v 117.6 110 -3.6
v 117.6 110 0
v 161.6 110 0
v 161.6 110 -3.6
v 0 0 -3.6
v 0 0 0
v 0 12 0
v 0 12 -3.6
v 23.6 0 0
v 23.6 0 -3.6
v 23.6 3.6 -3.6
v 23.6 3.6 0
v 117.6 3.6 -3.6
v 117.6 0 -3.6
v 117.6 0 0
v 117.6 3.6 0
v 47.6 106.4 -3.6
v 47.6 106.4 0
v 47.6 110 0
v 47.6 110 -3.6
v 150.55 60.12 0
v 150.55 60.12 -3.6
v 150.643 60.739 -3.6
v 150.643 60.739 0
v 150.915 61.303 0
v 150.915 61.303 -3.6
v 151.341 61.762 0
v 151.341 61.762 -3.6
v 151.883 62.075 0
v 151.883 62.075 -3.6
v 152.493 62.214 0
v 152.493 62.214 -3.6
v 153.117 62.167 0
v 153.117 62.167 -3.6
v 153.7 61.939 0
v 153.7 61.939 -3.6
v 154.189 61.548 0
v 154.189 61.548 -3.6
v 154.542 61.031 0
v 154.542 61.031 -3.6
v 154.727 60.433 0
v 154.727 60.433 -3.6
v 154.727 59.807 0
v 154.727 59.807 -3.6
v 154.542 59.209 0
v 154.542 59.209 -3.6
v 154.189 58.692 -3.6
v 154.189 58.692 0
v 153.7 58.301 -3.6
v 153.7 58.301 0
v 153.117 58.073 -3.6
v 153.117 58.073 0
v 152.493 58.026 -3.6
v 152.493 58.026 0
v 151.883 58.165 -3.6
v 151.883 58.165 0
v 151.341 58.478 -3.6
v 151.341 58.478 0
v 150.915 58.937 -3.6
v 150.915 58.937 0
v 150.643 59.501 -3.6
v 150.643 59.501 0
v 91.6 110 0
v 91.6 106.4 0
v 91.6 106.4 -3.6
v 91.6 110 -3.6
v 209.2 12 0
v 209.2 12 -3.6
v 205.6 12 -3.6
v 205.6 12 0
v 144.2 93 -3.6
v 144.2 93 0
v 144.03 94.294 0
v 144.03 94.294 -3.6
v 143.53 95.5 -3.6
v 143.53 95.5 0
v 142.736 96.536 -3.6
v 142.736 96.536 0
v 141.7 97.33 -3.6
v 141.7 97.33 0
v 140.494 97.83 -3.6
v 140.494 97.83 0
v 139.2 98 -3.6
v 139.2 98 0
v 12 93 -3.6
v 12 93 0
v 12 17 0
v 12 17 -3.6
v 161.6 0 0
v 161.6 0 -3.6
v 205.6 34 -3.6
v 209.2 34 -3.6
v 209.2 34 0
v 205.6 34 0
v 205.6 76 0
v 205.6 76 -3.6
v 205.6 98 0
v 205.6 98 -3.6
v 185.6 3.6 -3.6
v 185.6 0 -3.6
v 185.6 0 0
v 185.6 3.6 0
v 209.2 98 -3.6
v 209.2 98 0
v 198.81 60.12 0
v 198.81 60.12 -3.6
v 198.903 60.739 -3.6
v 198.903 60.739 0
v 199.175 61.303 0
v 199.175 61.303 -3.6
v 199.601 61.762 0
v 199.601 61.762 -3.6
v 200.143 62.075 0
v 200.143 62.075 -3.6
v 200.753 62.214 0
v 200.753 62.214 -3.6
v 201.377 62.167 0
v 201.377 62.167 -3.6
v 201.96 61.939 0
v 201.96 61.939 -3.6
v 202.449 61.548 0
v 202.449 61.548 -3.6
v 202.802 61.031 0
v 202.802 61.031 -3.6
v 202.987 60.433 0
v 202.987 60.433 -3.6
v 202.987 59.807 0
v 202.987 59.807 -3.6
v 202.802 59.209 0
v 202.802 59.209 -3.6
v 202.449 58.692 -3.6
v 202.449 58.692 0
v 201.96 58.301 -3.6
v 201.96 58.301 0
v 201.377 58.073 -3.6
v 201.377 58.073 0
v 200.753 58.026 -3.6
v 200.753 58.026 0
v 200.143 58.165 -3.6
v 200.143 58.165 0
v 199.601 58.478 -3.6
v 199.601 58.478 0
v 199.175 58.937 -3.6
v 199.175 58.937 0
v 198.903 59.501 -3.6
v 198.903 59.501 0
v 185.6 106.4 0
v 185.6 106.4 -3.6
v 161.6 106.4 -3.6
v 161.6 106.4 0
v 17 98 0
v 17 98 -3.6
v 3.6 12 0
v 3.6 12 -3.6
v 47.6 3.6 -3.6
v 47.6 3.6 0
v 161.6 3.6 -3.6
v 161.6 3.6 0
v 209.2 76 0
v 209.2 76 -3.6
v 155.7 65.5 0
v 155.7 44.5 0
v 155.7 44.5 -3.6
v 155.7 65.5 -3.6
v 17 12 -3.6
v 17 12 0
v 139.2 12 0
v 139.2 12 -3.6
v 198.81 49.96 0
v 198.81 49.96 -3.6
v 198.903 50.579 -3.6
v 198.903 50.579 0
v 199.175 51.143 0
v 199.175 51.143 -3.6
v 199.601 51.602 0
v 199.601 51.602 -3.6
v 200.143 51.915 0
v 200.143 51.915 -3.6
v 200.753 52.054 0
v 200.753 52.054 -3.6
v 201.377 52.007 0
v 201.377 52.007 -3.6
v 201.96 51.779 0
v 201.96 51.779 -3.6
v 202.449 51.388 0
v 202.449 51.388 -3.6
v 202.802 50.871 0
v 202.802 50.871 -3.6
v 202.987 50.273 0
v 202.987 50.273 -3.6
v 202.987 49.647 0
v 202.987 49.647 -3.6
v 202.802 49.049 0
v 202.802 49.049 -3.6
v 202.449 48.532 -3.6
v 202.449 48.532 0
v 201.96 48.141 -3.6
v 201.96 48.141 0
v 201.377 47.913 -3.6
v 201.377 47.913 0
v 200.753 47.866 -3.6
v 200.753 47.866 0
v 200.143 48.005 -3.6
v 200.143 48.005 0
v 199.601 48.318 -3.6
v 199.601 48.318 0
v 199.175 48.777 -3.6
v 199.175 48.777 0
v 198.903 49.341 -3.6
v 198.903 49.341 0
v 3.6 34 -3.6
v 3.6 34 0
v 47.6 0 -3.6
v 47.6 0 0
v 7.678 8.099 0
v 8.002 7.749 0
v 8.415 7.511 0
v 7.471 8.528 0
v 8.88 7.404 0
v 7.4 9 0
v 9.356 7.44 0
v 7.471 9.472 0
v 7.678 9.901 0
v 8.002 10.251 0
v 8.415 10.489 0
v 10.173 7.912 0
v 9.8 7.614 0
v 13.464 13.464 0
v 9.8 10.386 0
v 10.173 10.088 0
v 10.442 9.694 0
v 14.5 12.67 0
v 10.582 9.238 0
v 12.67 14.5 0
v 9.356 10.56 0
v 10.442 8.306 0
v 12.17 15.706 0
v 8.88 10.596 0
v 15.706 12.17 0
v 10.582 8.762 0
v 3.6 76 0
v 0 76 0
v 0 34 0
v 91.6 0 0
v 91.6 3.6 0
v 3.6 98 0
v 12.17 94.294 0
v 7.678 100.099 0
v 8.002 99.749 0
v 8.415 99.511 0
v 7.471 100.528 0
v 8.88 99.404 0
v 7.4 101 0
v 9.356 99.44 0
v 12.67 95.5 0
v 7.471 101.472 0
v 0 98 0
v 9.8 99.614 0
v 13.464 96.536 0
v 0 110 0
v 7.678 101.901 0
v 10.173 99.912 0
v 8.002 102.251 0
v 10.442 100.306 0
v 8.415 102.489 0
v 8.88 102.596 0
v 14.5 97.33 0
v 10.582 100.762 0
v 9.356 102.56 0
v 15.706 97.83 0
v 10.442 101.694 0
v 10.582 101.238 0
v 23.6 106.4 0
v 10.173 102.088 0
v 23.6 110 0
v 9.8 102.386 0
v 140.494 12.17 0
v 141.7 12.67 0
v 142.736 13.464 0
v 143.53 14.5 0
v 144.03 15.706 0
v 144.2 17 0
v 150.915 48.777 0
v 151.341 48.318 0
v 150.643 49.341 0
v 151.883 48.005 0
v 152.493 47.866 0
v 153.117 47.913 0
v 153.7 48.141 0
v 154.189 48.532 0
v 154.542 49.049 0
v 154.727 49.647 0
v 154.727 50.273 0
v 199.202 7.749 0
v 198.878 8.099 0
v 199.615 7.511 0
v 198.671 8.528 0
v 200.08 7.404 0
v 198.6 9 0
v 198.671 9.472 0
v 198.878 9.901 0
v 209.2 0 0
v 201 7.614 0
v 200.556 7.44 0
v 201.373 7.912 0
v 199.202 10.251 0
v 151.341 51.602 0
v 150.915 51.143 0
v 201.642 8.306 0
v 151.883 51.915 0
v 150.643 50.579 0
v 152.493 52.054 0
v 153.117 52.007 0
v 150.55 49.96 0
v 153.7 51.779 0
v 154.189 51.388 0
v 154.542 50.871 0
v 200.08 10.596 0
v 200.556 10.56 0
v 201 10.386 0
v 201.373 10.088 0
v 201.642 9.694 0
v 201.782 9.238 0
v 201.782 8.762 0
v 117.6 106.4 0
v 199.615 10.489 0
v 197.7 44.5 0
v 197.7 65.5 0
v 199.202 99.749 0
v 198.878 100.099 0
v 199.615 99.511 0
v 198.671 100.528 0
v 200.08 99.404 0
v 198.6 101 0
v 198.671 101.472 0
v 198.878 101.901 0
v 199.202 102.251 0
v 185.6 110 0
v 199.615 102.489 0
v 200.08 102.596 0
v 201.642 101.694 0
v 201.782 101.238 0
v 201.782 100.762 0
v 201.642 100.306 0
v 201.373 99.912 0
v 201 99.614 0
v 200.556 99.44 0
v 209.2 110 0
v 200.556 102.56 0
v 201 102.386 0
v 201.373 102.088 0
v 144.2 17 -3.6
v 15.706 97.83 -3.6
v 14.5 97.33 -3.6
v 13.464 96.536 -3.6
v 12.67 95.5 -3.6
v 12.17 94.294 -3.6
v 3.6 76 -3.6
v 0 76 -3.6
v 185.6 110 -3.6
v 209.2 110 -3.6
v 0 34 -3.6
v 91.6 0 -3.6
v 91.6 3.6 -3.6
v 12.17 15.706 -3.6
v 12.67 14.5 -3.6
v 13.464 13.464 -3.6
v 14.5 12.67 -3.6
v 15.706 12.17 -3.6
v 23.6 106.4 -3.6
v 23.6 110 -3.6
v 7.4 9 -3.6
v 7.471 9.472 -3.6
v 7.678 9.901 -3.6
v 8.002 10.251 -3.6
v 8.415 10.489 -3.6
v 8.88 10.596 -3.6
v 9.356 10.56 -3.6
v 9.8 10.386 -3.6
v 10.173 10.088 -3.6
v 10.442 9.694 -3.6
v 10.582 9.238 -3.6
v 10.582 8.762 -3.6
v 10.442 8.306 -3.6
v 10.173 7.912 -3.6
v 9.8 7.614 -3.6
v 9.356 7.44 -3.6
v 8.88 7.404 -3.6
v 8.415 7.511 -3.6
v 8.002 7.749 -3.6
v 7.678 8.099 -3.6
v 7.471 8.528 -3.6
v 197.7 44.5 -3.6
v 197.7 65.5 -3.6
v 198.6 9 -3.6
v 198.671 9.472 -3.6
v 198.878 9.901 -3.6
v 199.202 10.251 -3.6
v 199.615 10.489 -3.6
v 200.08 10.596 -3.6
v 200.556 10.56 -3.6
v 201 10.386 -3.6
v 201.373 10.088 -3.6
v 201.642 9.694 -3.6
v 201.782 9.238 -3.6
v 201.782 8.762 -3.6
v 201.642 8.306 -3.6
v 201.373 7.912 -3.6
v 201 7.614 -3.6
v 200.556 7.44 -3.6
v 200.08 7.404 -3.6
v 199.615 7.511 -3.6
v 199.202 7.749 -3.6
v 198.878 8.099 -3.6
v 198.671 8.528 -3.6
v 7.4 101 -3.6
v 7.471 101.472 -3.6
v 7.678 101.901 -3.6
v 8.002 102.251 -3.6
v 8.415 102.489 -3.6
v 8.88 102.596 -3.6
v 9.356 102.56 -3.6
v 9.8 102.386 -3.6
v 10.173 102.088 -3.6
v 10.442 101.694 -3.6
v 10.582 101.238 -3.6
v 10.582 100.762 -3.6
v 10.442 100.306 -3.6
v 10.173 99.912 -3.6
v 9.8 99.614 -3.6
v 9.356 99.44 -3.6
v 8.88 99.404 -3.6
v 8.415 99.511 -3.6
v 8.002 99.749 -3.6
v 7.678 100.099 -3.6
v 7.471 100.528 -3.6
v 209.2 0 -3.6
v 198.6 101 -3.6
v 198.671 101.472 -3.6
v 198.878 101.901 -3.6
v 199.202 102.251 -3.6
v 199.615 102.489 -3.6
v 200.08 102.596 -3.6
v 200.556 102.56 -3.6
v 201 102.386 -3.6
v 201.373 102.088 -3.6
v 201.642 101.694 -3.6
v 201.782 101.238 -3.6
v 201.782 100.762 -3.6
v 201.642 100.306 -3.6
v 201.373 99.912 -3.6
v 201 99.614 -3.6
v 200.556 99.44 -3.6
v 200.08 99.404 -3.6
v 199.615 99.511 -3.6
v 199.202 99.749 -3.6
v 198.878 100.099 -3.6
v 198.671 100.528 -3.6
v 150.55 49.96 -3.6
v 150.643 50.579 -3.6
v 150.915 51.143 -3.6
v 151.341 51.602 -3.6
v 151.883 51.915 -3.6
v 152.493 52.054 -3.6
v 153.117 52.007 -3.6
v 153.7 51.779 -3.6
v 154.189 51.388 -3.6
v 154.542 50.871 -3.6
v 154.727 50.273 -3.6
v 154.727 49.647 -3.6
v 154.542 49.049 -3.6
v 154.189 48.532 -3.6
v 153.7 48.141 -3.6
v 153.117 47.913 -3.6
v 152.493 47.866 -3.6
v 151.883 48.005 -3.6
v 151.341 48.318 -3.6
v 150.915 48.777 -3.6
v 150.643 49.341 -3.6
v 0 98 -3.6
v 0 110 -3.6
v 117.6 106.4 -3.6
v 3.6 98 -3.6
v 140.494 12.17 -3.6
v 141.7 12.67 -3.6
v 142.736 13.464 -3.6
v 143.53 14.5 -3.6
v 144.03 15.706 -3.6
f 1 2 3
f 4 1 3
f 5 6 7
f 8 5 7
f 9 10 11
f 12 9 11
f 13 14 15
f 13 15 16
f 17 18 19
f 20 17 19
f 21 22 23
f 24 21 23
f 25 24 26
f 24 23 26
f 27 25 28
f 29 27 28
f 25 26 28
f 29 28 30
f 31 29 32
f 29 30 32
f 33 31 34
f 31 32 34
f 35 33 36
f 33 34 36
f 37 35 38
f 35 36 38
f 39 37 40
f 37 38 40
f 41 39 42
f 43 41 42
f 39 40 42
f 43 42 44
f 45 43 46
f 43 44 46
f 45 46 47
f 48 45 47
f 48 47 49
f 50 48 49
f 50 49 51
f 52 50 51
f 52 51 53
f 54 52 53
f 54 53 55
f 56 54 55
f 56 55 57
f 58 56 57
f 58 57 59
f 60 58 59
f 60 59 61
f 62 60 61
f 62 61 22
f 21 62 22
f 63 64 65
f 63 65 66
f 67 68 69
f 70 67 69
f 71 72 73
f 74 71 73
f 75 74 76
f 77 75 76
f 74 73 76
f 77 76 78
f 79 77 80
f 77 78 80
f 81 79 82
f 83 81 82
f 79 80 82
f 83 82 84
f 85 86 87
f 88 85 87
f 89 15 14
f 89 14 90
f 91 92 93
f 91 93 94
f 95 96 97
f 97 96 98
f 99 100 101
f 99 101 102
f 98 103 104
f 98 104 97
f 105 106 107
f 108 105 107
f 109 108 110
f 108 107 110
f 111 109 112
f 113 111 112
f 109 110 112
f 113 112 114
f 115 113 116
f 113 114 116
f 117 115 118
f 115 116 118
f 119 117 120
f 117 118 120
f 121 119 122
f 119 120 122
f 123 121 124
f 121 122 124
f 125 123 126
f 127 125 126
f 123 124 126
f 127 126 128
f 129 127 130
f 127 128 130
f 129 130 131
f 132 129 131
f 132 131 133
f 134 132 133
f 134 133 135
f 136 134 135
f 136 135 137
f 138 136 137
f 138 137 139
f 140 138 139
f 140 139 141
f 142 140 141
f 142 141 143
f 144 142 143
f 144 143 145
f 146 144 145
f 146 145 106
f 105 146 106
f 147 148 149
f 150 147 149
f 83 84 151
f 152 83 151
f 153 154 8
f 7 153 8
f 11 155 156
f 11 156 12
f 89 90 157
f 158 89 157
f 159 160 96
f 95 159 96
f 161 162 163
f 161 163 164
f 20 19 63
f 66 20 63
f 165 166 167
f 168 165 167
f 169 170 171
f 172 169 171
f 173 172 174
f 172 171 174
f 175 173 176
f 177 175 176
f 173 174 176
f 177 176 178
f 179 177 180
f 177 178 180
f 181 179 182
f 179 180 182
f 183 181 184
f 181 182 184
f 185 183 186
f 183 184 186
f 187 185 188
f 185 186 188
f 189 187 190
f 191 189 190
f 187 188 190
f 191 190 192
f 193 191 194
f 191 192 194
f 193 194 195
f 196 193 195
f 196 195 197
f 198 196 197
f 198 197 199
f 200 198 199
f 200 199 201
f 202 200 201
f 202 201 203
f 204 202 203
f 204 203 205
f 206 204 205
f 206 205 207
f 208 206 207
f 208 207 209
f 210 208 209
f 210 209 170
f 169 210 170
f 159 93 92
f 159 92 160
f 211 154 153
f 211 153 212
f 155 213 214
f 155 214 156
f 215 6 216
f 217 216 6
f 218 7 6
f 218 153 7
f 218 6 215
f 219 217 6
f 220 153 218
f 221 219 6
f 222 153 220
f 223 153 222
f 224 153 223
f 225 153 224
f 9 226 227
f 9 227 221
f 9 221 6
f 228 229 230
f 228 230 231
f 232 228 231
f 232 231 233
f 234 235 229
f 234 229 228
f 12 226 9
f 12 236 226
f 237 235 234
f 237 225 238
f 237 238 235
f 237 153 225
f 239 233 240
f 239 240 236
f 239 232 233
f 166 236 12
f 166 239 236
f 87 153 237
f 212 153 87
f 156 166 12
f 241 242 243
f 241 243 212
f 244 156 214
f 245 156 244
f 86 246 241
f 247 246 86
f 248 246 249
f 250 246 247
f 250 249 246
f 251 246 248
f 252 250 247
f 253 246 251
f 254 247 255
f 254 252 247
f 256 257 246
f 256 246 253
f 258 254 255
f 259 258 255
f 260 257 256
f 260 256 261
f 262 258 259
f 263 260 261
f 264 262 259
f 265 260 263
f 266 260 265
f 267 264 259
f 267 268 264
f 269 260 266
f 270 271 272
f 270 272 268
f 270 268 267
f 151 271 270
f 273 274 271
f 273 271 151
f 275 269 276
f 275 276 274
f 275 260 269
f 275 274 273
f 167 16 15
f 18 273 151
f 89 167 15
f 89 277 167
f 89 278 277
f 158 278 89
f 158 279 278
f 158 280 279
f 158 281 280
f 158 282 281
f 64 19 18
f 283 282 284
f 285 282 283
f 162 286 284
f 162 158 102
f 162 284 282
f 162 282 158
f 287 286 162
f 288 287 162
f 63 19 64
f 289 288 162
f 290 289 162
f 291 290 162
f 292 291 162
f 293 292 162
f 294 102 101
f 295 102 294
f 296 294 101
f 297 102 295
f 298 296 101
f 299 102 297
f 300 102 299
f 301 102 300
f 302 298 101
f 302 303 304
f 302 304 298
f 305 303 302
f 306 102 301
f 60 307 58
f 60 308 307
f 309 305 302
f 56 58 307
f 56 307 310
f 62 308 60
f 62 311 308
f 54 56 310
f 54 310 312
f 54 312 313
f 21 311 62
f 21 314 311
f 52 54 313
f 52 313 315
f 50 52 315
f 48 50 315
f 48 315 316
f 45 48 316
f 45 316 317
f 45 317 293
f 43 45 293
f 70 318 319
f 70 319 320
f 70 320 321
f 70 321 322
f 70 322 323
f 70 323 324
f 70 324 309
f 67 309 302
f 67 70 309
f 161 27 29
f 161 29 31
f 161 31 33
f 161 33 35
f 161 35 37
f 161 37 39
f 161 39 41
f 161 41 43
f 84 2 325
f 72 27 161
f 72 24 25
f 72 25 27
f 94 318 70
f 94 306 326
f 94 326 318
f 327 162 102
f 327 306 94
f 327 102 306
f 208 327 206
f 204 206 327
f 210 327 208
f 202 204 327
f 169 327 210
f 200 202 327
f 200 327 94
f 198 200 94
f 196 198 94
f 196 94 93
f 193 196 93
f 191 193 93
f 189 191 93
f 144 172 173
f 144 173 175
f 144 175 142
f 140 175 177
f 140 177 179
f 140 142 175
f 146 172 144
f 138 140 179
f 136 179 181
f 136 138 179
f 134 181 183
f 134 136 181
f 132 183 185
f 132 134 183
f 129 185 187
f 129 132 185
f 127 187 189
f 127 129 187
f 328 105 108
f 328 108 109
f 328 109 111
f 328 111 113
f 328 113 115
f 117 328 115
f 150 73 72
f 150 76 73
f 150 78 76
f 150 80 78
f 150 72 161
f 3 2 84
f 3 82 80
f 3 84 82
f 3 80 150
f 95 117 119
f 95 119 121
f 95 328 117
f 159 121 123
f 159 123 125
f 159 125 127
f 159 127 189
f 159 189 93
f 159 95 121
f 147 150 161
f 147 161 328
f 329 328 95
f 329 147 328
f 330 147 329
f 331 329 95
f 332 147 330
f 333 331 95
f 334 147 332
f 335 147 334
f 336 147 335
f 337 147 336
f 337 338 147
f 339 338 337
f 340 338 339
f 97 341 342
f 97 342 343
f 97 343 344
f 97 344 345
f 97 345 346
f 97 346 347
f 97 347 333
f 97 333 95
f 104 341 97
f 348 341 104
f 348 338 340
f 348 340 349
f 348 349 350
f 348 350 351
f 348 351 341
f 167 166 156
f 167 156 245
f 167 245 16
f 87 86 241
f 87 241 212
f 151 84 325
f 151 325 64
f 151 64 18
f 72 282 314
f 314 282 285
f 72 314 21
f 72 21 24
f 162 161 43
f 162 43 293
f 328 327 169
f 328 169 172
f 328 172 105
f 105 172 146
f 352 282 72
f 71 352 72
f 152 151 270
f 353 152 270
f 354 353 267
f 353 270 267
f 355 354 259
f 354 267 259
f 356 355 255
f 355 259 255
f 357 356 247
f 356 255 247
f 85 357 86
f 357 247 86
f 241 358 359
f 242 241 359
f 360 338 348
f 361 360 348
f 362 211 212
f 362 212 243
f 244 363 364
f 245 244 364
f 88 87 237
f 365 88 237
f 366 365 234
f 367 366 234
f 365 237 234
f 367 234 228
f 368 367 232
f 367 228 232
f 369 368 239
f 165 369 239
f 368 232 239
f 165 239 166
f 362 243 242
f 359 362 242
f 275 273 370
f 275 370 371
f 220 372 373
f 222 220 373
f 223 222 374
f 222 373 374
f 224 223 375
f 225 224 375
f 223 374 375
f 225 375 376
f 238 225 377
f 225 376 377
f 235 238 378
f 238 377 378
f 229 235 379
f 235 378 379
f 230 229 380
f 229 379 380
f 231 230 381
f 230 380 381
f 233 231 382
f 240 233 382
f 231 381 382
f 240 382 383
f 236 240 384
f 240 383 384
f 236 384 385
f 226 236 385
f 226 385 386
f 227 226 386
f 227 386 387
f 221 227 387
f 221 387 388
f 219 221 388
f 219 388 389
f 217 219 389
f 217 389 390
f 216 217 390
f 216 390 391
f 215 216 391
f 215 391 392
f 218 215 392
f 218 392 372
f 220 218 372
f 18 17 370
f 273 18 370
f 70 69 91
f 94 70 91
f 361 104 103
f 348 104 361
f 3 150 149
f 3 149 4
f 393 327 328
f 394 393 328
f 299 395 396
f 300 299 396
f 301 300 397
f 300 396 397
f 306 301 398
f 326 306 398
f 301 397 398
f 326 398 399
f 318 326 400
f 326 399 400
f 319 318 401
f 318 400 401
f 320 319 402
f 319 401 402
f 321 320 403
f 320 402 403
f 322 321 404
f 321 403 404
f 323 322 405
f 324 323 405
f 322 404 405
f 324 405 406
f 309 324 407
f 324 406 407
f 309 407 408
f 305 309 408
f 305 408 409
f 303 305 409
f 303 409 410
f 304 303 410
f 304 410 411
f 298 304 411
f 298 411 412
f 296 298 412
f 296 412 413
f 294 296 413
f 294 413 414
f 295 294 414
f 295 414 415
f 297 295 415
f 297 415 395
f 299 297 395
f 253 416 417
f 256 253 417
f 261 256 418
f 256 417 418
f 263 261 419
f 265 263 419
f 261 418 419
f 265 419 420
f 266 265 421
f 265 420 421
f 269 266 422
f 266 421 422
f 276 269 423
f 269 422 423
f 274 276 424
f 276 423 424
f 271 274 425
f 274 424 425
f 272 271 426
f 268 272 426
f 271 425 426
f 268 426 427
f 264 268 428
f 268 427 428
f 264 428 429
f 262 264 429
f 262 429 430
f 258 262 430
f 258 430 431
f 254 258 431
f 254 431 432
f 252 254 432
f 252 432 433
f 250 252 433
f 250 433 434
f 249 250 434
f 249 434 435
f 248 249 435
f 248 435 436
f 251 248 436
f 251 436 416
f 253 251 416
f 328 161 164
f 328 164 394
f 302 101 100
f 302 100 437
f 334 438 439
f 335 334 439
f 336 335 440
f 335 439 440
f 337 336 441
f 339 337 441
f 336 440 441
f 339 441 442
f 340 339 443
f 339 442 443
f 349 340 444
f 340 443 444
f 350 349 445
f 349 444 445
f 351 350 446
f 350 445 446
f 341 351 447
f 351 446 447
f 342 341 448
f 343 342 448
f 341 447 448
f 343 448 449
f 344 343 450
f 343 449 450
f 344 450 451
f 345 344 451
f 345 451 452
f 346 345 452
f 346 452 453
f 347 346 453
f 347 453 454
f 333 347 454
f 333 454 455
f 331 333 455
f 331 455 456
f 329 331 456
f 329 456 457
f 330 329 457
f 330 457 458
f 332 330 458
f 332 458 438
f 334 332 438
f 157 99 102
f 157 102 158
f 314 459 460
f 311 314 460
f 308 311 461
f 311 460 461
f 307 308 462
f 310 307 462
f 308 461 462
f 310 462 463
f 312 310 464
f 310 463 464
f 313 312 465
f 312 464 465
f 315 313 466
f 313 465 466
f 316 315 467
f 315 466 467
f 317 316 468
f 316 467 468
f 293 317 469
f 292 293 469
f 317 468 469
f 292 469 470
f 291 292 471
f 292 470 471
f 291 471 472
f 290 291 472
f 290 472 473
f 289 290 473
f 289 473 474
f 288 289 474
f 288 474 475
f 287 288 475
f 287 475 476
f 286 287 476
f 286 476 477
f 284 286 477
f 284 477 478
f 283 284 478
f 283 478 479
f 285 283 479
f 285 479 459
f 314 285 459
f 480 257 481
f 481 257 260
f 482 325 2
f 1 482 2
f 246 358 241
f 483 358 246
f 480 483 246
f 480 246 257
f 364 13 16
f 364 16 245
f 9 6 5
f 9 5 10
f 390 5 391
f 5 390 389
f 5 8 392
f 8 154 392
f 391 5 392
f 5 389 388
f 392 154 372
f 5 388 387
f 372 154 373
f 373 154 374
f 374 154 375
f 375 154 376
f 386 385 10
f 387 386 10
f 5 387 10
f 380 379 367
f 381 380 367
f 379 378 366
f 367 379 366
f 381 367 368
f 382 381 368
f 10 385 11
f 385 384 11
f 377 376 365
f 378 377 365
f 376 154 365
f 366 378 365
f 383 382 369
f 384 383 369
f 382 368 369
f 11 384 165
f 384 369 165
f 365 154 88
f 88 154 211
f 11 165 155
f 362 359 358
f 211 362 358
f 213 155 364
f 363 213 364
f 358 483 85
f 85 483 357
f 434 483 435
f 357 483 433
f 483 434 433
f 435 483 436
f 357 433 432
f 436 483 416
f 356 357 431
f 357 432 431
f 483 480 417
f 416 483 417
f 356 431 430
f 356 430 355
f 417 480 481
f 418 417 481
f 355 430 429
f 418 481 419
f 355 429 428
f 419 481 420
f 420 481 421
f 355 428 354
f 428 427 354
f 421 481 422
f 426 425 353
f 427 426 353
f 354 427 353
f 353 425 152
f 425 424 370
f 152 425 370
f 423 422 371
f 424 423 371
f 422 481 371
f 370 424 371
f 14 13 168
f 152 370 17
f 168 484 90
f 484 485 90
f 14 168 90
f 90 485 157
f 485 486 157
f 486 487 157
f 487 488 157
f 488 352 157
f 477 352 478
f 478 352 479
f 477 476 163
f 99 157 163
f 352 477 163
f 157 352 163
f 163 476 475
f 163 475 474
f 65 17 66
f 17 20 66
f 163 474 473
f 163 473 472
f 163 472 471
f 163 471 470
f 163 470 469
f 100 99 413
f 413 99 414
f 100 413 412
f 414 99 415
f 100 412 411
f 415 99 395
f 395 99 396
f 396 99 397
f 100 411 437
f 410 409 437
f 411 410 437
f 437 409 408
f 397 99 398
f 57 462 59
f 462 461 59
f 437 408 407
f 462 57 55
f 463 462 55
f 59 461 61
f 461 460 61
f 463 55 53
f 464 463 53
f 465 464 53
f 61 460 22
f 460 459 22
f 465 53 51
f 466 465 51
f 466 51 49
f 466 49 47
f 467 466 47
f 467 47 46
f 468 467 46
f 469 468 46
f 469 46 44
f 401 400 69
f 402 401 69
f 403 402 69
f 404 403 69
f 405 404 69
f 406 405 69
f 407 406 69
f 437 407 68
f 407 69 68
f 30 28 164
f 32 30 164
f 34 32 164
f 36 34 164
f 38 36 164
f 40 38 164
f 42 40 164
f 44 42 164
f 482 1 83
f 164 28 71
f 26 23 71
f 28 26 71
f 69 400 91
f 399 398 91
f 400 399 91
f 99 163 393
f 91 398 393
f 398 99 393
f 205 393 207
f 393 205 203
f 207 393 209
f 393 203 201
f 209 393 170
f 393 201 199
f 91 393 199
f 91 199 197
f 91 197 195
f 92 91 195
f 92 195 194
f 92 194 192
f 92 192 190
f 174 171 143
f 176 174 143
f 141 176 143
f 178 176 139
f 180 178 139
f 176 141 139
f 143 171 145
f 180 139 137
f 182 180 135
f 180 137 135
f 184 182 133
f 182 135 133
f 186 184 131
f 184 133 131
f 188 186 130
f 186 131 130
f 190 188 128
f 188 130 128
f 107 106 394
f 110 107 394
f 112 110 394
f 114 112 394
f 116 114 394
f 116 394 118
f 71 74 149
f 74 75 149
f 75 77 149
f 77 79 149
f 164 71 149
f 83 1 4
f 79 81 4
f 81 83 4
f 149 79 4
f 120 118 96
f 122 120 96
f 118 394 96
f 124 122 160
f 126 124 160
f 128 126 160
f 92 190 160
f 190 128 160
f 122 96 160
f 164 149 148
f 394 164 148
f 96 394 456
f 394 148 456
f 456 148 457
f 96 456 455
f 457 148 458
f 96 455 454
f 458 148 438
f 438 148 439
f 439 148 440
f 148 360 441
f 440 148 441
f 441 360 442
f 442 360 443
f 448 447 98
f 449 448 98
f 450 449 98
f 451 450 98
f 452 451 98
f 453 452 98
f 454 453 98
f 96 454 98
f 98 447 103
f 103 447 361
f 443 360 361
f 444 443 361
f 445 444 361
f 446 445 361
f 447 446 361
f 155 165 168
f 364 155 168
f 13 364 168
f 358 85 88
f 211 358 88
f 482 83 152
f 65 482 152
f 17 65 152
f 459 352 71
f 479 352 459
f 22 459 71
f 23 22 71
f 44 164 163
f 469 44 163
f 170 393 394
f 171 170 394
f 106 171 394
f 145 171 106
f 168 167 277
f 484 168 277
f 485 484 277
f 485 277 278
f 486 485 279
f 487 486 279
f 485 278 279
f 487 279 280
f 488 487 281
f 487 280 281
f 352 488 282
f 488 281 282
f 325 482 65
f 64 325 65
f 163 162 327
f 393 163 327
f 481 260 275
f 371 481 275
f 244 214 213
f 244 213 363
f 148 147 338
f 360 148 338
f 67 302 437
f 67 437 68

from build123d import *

# Parameters (mm, degrees)
SKETCH_1_W             = 209.2
SKETCH_1_H             = 110
SM_BASE_FLANGE_1_DEPTH = 3.6
CUT_EXTRUDE_1_REACH    = 238.384
SKETCH_6_W             = 42
SKETCH_6_H             = 21
CUT_EXTRUDE_2_REACH    = 238.384
SKETCH_7_W             = 3.6
SKETCH_7_H             = 22
SKETCH_7_W_2           = 24
SKETCH_7_H_2           = 3.6
SKETCH_7_W_3           = 26
SKETCH_8_R             = 1.6
CUT_EXTRUDE_3_DEPTH    = 10
CUT_EXTRUDE_4_REACH    = 238.384
SKETCH_9_R             = 2.1


# Sheet-metal steps are written as plain solids
with BuildPart() as part:
    # Sketch 1 → Базовая кромка1 (new body)
    with BuildSketch(Plane.XY):
        with Locations((104.6, 55)):
            Rectangle(SKETCH_1_W, SKETCH_1_H)
        with BuildLine():
            Line((17, 12), (139.2, 12))
            ThreePointArc((139.2, 12), (142.735533906, 13.464466094), (144.2, 17))
            Line((144.2, 17), (144.2, 93))
            ThreePointArc((144.2, 93), (142.735533906, 96.535533906), (139.2, 98))
            Line((139.2, 98), (17, 98))
            ThreePointArc((17, 98), (13.464466094, 96.535533906), (12, 93))
            Line((12, 93), (12, 17))
            ThreePointArc((12, 17), (13.464466094, 13.464466094), (17, 12))
        make_face(mode=Mode.SUBTRACT)
    extrude(amount=-SM_BASE_FLANGE_1_DEPTH)

    # Эскиз6 → Вырез-Вытянуть1 (cut, up to next)
    with BuildSketch(Plane.XY, mode=Mode.PRIVATE) as cut_extrude_1_sk1:
        with Locations((176.7, 55)):
            Rectangle(SKETCH_6_W, SKETCH_6_H)
    cut_extrude_1_tool1 = extrude(cut_extrude_1_sk1.sketch, amount=-CUT_EXTRUDE_1_REACH, mode=Mode.PRIVATE) & part.part
    add(cut_extrude_1_tool1.solids().sort_by_distance((176.7, 55, 0))[0], mode=Mode.SUBTRACT)

    # Эскиз7 → Вырез-Вытянуть2 (cut, up to next)
    with BuildSketch(Plane(origin=(0, 0, -3.6), x_dir=(-1, 0, 0), z_dir=(0, 0, -1)), mode=Mode.PRIVATE) as cut_extrude_2_sk1:
        with Locations((-1.8, 87)):
            Rectangle(SKETCH_7_W, SKETCH_7_H)
    cut_extrude_2_tool1 = extrude(cut_extrude_2_sk1.sketch, amount=-CUT_EXTRUDE_2_REACH, mode=Mode.PRIVATE) & part.part
    # Эскиз7 → Вырез-Вытянуть2 (cut, up to next)
    with BuildSketch(Plane(origin=(0, 0, -3.6), x_dir=(-1, 0, 0), z_dir=(0, 0, -1)), mode=Mode.PRIVATE) as cut_extrude_2_sk2:
        with Locations((-35.6, 108.2)):
            Rectangle(SKETCH_7_W_2, SKETCH_7_H_2)
    cut_extrude_2_tool2 = extrude(cut_extrude_2_sk2.sketch, amount=-CUT_EXTRUDE_2_REACH, mode=Mode.PRIVATE) & part.part
    # Эскиз7 → Вырез-Вытянуть2 (cut, up to next)
    with BuildSketch(Plane(origin=(0, 0, -3.6), x_dir=(-1, 0, 0), z_dir=(0, 0, -1)), mode=Mode.PRIVATE) as cut_extrude_2_sk3:
        with Locations((-104.6, 108.2)):
            Rectangle(SKETCH_7_W_3, SKETCH_7_H_2)
    cut_extrude_2_tool3 = extrude(cut_extrude_2_sk3.sketch, amount=-CUT_EXTRUDE_2_REACH, mode=Mode.PRIVATE) & part.part
    # Эскиз7 → Вырез-Вытянуть2 (cut, up to next)
    with BuildSketch(Plane(origin=(0, 0, -3.6), x_dir=(-1, 0, 0), z_dir=(0, 0, -1)), mode=Mode.PRIVATE) as cut_extrude_2_sk4:
        with Locations((-173.6, 108.2)):
            Rectangle(SKETCH_7_W_2, SKETCH_7_H_2)
    cut_extrude_2_tool4 = extrude(cut_extrude_2_sk4.sketch, amount=-CUT_EXTRUDE_2_REACH, mode=Mode.PRIVATE) & part.part
    # Эскиз7 → Вырез-Вытянуть2 (cut, up to next)
    with BuildSketch(Plane(origin=(0, 0, -3.6), x_dir=(-1, 0, 0), z_dir=(0, 0, -1)), mode=Mode.PRIVATE) as cut_extrude_2_sk5:
        with Locations((-207.4, 87)):
            Rectangle(SKETCH_7_W, SKETCH_7_H)
    cut_extrude_2_tool5 = extrude(cut_extrude_2_sk5.sketch, amount=-CUT_EXTRUDE_2_REACH, mode=Mode.PRIVATE) & part.part
    # Эскиз7 → Вырез-Вытянуть2 (cut, up to next)
    with BuildSketch(Plane(origin=(0, 0, -3.6), x_dir=(-1, 0, 0), z_dir=(0, 0, -1)), mode=Mode.PRIVATE) as cut_extrude_2_sk6:
        with Locations((-207.4, 23)):
            Rectangle(SKETCH_7_W, SKETCH_7_H)
    cut_extrude_2_tool6 = extrude(cut_extrude_2_sk6.sketch, amount=-CUT_EXTRUDE_2_REACH, mode=Mode.PRIVATE) & part.part
    # Эскиз7 → Вырез-Вытянуть2 (cut, up to next)
    with BuildSketch(Plane(origin=(0, 0, -3.6), x_dir=(-1, 0, 0), z_dir=(0, 0, -1)), mode=Mode.PRIVATE) as cut_extrude_2_sk7:
        with Locations((-173.6, 1.8)):
            Rectangle(SKETCH_7_W_2, SKETCH_7_H_2)
    cut_extrude_2_tool7 = extrude(cut_extrude_2_sk7.sketch, amount=-CUT_EXTRUDE_2_REACH, mode=Mode.PRIVATE) & part.part
    # Эскиз7 → Вырез-Вытянуть2 (cut, up to next)
    with BuildSketch(Plane(origin=(0, 0, -3.6), x_dir=(-1, 0, 0), z_dir=(0, 0, -1)), mode=Mode.PRIVATE) as cut_extrude_2_sk8:
        with Locations((-104.6, 1.8)):
            Rectangle(SKETCH_7_W_3, SKETCH_7_H_2)
    cut_extrude_2_tool8 = extrude(cut_extrude_2_sk8.sketch, amount=-CUT_EXTRUDE_2_REACH, mode=Mode.PRIVATE) & part.part
    # Эскиз7 → Вырез-Вытянуть2 (cut, up to next)
    with BuildSketch(Plane(origin=(0, 0, -3.6), x_dir=(-1, 0, 0), z_dir=(0, 0, -1)), mode=Mode.PRIVATE) as cut_extrude_2_sk9:
        with Locations((-35.6, 1.8)):
            Rectangle(SKETCH_7_W_2, SKETCH_7_H_2)
    cut_extrude_2_tool9 = extrude(cut_extrude_2_sk9.sketch, amount=-CUT_EXTRUDE_2_REACH, mode=Mode.PRIVATE) & part.part
    # Эскиз7 → Вырез-Вытянуть2 (cut, up to next)
    with BuildSketch(Plane(origin=(0, 0, -3.6), x_dir=(-1, 0, 0), z_dir=(0, 0, -1)), mode=Mode.PRIVATE) as cut_extrude_2_sk10:
        with Locations((-1.8, 23)):
            Rectangle(SKETCH_7_W, SKETCH_7_H)
    cut_extrude_2_tool10 = extrude(cut_extrude_2_sk10.sketch, amount=-CUT_EXTRUDE_2_REACH, mode=Mode.PRIVATE) & part.part
    add(cut_extrude_2_tool1.solids().sort_by_distance((1.8, 87, -3.6))[0], mode=Mode.SUBTRACT)
    add(cut_extrude_2_tool2.solids().sort_by_distance((35.6, 108.2, -3.6))[0], mode=Mode.SUBTRACT)
    add(cut_extrude_2_tool3.solids().sort_by_distance((104.6, 108.2, -3.6))[0], mode=Mode.SUBTRACT)
    add(cut_extrude_2_tool4.solids().sort_by_distance((173.6, 108.2, -3.6))[0], mode=Mode.SUBTRACT)
    add(cut_extrude_2_tool5.solids().sort_by_distance((207.4, 87, -3.6))[0], mode=Mode.SUBTRACT)
    add(cut_extrude_2_tool6.solids().sort_by_distance((207.4, 23, -3.6))[0], mode=Mode.SUBTRACT)
    add(cut_extrude_2_tool7.solids().sort_by_distance((173.6, 1.8, -3.6))[0], mode=Mode.SUBTRACT)
    add(cut_extrude_2_tool8.solids().sort_by_distance((104.6, 1.8, -3.6))[0], mode=Mode.SUBTRACT)
    add(cut_extrude_2_tool9.solids().sort_by_distance((35.6, 1.8, -3.6))[0], mode=Mode.SUBTRACT)
    add(cut_extrude_2_tool10.solids().sort_by_distance((1.8, 23, -3.6))[0], mode=Mode.SUBTRACT)

    # Эскиз8 → Вырез-Вытянуть3 (cut)
    with BuildSketch(Plane(origin=(0, 0, -3.6), x_dir=(-1, 0, 0), z_dir=(0, 0, -1))):
        with Locations((-200.2, 9)):
            Circle(SKETCH_8_R)
        with Locations((-9, 9)):
            Circle(SKETCH_8_R)
        with Locations((-9, 101)):
            Circle(SKETCH_8_R)
        with Locations((-200.2, 101)):
            Circle(SKETCH_8_R)
    extrude(amount=-CUT_EXTRUDE_3_DEPTH, mode=Mode.SUBTRACT)

    # Эскиз9 → Вырез-Вытянуть4 (cut, up to next)
    with BuildSketch(Plane(origin=(0, 0, -3.6), x_dir=(-1, 0, 0), z_dir=(0, 0, -1)), mode=Mode.PRIVATE) as cut_extrude_4_sk1:
        with Locations((-200.91, 60.12)):
            Circle(SKETCH_9_R)
    cut_extrude_4_tool1 = extrude(cut_extrude_4_sk1.sketch, amount=-CUT_EXTRUDE_4_REACH, mode=Mode.PRIVATE) & part.part
    # Эскиз9 → Вырез-Вытянуть4 (cut, up to next)
    with BuildSketch(Plane(origin=(0, 0, -3.6), x_dir=(-1, 0, 0), z_dir=(0, 0, -1)), mode=Mode.PRIVATE) as cut_extrude_4_sk2:
        with Locations((-200.91, 49.96)):
            Circle(SKETCH_9_R)
    cut_extrude_4_tool2 = extrude(cut_extrude_4_sk2.sketch, amount=-CUT_EXTRUDE_4_REACH, mode=Mode.PRIVATE) & part.part
    # Эскиз9 → Вырез-Вытянуть4 (cut, up to next)
    with BuildSketch(Plane(origin=(0, 0, -3.6), x_dir=(-1, 0, 0), z_dir=(0, 0, -1)), mode=Mode.PRIVATE) as cut_extrude_4_sk3:
        with Locations((-152.65, 60.12)):
            Circle(SKETCH_9_R)
    cut_extrude_4_tool3 = extrude(cut_extrude_4_sk3.sketch, amount=-CUT_EXTRUDE_4_REACH, mode=Mode.PRIVATE) & part.part
    # Эскиз9 → Вырез-Вытянуть4 (cut, up to next)
    with BuildSketch(Plane(origin=(0, 0, -3.6), x_dir=(-1, 0, 0), z_dir=(0, 0, -1)), mode=Mode.PRIVATE) as cut_extrude_4_sk4:
        with Locations((-152.65, 49.96)):
            Circle(SKETCH_9_R)
    cut_extrude_4_tool4 = extrude(cut_extrude_4_sk4.sketch, amount=-CUT_EXTRUDE_4_REACH, mode=Mode.PRIVATE) & part.part
    add(cut_extrude_4_tool1.solids().sort_by_distance((200.91, 60.12, -3.6))[0], mode=Mode.SUBTRACT)
    add(cut_extrude_4_tool2.solids().sort_by_distance((200.91, 49.96, -3.6))[0], mode=Mode.SUBTRACT)
    add(cut_extrude_4_tool3.solids().sort_by_distance((152.65, 60.12, -3.6))[0], mode=Mode.SUBTRACT)
    add(cut_extrude_4_tool4.solids().sort_by_distance((152.65, 49.96, -3.6))[0], mode=Mode.SUBTRACT)


solid = part.part
